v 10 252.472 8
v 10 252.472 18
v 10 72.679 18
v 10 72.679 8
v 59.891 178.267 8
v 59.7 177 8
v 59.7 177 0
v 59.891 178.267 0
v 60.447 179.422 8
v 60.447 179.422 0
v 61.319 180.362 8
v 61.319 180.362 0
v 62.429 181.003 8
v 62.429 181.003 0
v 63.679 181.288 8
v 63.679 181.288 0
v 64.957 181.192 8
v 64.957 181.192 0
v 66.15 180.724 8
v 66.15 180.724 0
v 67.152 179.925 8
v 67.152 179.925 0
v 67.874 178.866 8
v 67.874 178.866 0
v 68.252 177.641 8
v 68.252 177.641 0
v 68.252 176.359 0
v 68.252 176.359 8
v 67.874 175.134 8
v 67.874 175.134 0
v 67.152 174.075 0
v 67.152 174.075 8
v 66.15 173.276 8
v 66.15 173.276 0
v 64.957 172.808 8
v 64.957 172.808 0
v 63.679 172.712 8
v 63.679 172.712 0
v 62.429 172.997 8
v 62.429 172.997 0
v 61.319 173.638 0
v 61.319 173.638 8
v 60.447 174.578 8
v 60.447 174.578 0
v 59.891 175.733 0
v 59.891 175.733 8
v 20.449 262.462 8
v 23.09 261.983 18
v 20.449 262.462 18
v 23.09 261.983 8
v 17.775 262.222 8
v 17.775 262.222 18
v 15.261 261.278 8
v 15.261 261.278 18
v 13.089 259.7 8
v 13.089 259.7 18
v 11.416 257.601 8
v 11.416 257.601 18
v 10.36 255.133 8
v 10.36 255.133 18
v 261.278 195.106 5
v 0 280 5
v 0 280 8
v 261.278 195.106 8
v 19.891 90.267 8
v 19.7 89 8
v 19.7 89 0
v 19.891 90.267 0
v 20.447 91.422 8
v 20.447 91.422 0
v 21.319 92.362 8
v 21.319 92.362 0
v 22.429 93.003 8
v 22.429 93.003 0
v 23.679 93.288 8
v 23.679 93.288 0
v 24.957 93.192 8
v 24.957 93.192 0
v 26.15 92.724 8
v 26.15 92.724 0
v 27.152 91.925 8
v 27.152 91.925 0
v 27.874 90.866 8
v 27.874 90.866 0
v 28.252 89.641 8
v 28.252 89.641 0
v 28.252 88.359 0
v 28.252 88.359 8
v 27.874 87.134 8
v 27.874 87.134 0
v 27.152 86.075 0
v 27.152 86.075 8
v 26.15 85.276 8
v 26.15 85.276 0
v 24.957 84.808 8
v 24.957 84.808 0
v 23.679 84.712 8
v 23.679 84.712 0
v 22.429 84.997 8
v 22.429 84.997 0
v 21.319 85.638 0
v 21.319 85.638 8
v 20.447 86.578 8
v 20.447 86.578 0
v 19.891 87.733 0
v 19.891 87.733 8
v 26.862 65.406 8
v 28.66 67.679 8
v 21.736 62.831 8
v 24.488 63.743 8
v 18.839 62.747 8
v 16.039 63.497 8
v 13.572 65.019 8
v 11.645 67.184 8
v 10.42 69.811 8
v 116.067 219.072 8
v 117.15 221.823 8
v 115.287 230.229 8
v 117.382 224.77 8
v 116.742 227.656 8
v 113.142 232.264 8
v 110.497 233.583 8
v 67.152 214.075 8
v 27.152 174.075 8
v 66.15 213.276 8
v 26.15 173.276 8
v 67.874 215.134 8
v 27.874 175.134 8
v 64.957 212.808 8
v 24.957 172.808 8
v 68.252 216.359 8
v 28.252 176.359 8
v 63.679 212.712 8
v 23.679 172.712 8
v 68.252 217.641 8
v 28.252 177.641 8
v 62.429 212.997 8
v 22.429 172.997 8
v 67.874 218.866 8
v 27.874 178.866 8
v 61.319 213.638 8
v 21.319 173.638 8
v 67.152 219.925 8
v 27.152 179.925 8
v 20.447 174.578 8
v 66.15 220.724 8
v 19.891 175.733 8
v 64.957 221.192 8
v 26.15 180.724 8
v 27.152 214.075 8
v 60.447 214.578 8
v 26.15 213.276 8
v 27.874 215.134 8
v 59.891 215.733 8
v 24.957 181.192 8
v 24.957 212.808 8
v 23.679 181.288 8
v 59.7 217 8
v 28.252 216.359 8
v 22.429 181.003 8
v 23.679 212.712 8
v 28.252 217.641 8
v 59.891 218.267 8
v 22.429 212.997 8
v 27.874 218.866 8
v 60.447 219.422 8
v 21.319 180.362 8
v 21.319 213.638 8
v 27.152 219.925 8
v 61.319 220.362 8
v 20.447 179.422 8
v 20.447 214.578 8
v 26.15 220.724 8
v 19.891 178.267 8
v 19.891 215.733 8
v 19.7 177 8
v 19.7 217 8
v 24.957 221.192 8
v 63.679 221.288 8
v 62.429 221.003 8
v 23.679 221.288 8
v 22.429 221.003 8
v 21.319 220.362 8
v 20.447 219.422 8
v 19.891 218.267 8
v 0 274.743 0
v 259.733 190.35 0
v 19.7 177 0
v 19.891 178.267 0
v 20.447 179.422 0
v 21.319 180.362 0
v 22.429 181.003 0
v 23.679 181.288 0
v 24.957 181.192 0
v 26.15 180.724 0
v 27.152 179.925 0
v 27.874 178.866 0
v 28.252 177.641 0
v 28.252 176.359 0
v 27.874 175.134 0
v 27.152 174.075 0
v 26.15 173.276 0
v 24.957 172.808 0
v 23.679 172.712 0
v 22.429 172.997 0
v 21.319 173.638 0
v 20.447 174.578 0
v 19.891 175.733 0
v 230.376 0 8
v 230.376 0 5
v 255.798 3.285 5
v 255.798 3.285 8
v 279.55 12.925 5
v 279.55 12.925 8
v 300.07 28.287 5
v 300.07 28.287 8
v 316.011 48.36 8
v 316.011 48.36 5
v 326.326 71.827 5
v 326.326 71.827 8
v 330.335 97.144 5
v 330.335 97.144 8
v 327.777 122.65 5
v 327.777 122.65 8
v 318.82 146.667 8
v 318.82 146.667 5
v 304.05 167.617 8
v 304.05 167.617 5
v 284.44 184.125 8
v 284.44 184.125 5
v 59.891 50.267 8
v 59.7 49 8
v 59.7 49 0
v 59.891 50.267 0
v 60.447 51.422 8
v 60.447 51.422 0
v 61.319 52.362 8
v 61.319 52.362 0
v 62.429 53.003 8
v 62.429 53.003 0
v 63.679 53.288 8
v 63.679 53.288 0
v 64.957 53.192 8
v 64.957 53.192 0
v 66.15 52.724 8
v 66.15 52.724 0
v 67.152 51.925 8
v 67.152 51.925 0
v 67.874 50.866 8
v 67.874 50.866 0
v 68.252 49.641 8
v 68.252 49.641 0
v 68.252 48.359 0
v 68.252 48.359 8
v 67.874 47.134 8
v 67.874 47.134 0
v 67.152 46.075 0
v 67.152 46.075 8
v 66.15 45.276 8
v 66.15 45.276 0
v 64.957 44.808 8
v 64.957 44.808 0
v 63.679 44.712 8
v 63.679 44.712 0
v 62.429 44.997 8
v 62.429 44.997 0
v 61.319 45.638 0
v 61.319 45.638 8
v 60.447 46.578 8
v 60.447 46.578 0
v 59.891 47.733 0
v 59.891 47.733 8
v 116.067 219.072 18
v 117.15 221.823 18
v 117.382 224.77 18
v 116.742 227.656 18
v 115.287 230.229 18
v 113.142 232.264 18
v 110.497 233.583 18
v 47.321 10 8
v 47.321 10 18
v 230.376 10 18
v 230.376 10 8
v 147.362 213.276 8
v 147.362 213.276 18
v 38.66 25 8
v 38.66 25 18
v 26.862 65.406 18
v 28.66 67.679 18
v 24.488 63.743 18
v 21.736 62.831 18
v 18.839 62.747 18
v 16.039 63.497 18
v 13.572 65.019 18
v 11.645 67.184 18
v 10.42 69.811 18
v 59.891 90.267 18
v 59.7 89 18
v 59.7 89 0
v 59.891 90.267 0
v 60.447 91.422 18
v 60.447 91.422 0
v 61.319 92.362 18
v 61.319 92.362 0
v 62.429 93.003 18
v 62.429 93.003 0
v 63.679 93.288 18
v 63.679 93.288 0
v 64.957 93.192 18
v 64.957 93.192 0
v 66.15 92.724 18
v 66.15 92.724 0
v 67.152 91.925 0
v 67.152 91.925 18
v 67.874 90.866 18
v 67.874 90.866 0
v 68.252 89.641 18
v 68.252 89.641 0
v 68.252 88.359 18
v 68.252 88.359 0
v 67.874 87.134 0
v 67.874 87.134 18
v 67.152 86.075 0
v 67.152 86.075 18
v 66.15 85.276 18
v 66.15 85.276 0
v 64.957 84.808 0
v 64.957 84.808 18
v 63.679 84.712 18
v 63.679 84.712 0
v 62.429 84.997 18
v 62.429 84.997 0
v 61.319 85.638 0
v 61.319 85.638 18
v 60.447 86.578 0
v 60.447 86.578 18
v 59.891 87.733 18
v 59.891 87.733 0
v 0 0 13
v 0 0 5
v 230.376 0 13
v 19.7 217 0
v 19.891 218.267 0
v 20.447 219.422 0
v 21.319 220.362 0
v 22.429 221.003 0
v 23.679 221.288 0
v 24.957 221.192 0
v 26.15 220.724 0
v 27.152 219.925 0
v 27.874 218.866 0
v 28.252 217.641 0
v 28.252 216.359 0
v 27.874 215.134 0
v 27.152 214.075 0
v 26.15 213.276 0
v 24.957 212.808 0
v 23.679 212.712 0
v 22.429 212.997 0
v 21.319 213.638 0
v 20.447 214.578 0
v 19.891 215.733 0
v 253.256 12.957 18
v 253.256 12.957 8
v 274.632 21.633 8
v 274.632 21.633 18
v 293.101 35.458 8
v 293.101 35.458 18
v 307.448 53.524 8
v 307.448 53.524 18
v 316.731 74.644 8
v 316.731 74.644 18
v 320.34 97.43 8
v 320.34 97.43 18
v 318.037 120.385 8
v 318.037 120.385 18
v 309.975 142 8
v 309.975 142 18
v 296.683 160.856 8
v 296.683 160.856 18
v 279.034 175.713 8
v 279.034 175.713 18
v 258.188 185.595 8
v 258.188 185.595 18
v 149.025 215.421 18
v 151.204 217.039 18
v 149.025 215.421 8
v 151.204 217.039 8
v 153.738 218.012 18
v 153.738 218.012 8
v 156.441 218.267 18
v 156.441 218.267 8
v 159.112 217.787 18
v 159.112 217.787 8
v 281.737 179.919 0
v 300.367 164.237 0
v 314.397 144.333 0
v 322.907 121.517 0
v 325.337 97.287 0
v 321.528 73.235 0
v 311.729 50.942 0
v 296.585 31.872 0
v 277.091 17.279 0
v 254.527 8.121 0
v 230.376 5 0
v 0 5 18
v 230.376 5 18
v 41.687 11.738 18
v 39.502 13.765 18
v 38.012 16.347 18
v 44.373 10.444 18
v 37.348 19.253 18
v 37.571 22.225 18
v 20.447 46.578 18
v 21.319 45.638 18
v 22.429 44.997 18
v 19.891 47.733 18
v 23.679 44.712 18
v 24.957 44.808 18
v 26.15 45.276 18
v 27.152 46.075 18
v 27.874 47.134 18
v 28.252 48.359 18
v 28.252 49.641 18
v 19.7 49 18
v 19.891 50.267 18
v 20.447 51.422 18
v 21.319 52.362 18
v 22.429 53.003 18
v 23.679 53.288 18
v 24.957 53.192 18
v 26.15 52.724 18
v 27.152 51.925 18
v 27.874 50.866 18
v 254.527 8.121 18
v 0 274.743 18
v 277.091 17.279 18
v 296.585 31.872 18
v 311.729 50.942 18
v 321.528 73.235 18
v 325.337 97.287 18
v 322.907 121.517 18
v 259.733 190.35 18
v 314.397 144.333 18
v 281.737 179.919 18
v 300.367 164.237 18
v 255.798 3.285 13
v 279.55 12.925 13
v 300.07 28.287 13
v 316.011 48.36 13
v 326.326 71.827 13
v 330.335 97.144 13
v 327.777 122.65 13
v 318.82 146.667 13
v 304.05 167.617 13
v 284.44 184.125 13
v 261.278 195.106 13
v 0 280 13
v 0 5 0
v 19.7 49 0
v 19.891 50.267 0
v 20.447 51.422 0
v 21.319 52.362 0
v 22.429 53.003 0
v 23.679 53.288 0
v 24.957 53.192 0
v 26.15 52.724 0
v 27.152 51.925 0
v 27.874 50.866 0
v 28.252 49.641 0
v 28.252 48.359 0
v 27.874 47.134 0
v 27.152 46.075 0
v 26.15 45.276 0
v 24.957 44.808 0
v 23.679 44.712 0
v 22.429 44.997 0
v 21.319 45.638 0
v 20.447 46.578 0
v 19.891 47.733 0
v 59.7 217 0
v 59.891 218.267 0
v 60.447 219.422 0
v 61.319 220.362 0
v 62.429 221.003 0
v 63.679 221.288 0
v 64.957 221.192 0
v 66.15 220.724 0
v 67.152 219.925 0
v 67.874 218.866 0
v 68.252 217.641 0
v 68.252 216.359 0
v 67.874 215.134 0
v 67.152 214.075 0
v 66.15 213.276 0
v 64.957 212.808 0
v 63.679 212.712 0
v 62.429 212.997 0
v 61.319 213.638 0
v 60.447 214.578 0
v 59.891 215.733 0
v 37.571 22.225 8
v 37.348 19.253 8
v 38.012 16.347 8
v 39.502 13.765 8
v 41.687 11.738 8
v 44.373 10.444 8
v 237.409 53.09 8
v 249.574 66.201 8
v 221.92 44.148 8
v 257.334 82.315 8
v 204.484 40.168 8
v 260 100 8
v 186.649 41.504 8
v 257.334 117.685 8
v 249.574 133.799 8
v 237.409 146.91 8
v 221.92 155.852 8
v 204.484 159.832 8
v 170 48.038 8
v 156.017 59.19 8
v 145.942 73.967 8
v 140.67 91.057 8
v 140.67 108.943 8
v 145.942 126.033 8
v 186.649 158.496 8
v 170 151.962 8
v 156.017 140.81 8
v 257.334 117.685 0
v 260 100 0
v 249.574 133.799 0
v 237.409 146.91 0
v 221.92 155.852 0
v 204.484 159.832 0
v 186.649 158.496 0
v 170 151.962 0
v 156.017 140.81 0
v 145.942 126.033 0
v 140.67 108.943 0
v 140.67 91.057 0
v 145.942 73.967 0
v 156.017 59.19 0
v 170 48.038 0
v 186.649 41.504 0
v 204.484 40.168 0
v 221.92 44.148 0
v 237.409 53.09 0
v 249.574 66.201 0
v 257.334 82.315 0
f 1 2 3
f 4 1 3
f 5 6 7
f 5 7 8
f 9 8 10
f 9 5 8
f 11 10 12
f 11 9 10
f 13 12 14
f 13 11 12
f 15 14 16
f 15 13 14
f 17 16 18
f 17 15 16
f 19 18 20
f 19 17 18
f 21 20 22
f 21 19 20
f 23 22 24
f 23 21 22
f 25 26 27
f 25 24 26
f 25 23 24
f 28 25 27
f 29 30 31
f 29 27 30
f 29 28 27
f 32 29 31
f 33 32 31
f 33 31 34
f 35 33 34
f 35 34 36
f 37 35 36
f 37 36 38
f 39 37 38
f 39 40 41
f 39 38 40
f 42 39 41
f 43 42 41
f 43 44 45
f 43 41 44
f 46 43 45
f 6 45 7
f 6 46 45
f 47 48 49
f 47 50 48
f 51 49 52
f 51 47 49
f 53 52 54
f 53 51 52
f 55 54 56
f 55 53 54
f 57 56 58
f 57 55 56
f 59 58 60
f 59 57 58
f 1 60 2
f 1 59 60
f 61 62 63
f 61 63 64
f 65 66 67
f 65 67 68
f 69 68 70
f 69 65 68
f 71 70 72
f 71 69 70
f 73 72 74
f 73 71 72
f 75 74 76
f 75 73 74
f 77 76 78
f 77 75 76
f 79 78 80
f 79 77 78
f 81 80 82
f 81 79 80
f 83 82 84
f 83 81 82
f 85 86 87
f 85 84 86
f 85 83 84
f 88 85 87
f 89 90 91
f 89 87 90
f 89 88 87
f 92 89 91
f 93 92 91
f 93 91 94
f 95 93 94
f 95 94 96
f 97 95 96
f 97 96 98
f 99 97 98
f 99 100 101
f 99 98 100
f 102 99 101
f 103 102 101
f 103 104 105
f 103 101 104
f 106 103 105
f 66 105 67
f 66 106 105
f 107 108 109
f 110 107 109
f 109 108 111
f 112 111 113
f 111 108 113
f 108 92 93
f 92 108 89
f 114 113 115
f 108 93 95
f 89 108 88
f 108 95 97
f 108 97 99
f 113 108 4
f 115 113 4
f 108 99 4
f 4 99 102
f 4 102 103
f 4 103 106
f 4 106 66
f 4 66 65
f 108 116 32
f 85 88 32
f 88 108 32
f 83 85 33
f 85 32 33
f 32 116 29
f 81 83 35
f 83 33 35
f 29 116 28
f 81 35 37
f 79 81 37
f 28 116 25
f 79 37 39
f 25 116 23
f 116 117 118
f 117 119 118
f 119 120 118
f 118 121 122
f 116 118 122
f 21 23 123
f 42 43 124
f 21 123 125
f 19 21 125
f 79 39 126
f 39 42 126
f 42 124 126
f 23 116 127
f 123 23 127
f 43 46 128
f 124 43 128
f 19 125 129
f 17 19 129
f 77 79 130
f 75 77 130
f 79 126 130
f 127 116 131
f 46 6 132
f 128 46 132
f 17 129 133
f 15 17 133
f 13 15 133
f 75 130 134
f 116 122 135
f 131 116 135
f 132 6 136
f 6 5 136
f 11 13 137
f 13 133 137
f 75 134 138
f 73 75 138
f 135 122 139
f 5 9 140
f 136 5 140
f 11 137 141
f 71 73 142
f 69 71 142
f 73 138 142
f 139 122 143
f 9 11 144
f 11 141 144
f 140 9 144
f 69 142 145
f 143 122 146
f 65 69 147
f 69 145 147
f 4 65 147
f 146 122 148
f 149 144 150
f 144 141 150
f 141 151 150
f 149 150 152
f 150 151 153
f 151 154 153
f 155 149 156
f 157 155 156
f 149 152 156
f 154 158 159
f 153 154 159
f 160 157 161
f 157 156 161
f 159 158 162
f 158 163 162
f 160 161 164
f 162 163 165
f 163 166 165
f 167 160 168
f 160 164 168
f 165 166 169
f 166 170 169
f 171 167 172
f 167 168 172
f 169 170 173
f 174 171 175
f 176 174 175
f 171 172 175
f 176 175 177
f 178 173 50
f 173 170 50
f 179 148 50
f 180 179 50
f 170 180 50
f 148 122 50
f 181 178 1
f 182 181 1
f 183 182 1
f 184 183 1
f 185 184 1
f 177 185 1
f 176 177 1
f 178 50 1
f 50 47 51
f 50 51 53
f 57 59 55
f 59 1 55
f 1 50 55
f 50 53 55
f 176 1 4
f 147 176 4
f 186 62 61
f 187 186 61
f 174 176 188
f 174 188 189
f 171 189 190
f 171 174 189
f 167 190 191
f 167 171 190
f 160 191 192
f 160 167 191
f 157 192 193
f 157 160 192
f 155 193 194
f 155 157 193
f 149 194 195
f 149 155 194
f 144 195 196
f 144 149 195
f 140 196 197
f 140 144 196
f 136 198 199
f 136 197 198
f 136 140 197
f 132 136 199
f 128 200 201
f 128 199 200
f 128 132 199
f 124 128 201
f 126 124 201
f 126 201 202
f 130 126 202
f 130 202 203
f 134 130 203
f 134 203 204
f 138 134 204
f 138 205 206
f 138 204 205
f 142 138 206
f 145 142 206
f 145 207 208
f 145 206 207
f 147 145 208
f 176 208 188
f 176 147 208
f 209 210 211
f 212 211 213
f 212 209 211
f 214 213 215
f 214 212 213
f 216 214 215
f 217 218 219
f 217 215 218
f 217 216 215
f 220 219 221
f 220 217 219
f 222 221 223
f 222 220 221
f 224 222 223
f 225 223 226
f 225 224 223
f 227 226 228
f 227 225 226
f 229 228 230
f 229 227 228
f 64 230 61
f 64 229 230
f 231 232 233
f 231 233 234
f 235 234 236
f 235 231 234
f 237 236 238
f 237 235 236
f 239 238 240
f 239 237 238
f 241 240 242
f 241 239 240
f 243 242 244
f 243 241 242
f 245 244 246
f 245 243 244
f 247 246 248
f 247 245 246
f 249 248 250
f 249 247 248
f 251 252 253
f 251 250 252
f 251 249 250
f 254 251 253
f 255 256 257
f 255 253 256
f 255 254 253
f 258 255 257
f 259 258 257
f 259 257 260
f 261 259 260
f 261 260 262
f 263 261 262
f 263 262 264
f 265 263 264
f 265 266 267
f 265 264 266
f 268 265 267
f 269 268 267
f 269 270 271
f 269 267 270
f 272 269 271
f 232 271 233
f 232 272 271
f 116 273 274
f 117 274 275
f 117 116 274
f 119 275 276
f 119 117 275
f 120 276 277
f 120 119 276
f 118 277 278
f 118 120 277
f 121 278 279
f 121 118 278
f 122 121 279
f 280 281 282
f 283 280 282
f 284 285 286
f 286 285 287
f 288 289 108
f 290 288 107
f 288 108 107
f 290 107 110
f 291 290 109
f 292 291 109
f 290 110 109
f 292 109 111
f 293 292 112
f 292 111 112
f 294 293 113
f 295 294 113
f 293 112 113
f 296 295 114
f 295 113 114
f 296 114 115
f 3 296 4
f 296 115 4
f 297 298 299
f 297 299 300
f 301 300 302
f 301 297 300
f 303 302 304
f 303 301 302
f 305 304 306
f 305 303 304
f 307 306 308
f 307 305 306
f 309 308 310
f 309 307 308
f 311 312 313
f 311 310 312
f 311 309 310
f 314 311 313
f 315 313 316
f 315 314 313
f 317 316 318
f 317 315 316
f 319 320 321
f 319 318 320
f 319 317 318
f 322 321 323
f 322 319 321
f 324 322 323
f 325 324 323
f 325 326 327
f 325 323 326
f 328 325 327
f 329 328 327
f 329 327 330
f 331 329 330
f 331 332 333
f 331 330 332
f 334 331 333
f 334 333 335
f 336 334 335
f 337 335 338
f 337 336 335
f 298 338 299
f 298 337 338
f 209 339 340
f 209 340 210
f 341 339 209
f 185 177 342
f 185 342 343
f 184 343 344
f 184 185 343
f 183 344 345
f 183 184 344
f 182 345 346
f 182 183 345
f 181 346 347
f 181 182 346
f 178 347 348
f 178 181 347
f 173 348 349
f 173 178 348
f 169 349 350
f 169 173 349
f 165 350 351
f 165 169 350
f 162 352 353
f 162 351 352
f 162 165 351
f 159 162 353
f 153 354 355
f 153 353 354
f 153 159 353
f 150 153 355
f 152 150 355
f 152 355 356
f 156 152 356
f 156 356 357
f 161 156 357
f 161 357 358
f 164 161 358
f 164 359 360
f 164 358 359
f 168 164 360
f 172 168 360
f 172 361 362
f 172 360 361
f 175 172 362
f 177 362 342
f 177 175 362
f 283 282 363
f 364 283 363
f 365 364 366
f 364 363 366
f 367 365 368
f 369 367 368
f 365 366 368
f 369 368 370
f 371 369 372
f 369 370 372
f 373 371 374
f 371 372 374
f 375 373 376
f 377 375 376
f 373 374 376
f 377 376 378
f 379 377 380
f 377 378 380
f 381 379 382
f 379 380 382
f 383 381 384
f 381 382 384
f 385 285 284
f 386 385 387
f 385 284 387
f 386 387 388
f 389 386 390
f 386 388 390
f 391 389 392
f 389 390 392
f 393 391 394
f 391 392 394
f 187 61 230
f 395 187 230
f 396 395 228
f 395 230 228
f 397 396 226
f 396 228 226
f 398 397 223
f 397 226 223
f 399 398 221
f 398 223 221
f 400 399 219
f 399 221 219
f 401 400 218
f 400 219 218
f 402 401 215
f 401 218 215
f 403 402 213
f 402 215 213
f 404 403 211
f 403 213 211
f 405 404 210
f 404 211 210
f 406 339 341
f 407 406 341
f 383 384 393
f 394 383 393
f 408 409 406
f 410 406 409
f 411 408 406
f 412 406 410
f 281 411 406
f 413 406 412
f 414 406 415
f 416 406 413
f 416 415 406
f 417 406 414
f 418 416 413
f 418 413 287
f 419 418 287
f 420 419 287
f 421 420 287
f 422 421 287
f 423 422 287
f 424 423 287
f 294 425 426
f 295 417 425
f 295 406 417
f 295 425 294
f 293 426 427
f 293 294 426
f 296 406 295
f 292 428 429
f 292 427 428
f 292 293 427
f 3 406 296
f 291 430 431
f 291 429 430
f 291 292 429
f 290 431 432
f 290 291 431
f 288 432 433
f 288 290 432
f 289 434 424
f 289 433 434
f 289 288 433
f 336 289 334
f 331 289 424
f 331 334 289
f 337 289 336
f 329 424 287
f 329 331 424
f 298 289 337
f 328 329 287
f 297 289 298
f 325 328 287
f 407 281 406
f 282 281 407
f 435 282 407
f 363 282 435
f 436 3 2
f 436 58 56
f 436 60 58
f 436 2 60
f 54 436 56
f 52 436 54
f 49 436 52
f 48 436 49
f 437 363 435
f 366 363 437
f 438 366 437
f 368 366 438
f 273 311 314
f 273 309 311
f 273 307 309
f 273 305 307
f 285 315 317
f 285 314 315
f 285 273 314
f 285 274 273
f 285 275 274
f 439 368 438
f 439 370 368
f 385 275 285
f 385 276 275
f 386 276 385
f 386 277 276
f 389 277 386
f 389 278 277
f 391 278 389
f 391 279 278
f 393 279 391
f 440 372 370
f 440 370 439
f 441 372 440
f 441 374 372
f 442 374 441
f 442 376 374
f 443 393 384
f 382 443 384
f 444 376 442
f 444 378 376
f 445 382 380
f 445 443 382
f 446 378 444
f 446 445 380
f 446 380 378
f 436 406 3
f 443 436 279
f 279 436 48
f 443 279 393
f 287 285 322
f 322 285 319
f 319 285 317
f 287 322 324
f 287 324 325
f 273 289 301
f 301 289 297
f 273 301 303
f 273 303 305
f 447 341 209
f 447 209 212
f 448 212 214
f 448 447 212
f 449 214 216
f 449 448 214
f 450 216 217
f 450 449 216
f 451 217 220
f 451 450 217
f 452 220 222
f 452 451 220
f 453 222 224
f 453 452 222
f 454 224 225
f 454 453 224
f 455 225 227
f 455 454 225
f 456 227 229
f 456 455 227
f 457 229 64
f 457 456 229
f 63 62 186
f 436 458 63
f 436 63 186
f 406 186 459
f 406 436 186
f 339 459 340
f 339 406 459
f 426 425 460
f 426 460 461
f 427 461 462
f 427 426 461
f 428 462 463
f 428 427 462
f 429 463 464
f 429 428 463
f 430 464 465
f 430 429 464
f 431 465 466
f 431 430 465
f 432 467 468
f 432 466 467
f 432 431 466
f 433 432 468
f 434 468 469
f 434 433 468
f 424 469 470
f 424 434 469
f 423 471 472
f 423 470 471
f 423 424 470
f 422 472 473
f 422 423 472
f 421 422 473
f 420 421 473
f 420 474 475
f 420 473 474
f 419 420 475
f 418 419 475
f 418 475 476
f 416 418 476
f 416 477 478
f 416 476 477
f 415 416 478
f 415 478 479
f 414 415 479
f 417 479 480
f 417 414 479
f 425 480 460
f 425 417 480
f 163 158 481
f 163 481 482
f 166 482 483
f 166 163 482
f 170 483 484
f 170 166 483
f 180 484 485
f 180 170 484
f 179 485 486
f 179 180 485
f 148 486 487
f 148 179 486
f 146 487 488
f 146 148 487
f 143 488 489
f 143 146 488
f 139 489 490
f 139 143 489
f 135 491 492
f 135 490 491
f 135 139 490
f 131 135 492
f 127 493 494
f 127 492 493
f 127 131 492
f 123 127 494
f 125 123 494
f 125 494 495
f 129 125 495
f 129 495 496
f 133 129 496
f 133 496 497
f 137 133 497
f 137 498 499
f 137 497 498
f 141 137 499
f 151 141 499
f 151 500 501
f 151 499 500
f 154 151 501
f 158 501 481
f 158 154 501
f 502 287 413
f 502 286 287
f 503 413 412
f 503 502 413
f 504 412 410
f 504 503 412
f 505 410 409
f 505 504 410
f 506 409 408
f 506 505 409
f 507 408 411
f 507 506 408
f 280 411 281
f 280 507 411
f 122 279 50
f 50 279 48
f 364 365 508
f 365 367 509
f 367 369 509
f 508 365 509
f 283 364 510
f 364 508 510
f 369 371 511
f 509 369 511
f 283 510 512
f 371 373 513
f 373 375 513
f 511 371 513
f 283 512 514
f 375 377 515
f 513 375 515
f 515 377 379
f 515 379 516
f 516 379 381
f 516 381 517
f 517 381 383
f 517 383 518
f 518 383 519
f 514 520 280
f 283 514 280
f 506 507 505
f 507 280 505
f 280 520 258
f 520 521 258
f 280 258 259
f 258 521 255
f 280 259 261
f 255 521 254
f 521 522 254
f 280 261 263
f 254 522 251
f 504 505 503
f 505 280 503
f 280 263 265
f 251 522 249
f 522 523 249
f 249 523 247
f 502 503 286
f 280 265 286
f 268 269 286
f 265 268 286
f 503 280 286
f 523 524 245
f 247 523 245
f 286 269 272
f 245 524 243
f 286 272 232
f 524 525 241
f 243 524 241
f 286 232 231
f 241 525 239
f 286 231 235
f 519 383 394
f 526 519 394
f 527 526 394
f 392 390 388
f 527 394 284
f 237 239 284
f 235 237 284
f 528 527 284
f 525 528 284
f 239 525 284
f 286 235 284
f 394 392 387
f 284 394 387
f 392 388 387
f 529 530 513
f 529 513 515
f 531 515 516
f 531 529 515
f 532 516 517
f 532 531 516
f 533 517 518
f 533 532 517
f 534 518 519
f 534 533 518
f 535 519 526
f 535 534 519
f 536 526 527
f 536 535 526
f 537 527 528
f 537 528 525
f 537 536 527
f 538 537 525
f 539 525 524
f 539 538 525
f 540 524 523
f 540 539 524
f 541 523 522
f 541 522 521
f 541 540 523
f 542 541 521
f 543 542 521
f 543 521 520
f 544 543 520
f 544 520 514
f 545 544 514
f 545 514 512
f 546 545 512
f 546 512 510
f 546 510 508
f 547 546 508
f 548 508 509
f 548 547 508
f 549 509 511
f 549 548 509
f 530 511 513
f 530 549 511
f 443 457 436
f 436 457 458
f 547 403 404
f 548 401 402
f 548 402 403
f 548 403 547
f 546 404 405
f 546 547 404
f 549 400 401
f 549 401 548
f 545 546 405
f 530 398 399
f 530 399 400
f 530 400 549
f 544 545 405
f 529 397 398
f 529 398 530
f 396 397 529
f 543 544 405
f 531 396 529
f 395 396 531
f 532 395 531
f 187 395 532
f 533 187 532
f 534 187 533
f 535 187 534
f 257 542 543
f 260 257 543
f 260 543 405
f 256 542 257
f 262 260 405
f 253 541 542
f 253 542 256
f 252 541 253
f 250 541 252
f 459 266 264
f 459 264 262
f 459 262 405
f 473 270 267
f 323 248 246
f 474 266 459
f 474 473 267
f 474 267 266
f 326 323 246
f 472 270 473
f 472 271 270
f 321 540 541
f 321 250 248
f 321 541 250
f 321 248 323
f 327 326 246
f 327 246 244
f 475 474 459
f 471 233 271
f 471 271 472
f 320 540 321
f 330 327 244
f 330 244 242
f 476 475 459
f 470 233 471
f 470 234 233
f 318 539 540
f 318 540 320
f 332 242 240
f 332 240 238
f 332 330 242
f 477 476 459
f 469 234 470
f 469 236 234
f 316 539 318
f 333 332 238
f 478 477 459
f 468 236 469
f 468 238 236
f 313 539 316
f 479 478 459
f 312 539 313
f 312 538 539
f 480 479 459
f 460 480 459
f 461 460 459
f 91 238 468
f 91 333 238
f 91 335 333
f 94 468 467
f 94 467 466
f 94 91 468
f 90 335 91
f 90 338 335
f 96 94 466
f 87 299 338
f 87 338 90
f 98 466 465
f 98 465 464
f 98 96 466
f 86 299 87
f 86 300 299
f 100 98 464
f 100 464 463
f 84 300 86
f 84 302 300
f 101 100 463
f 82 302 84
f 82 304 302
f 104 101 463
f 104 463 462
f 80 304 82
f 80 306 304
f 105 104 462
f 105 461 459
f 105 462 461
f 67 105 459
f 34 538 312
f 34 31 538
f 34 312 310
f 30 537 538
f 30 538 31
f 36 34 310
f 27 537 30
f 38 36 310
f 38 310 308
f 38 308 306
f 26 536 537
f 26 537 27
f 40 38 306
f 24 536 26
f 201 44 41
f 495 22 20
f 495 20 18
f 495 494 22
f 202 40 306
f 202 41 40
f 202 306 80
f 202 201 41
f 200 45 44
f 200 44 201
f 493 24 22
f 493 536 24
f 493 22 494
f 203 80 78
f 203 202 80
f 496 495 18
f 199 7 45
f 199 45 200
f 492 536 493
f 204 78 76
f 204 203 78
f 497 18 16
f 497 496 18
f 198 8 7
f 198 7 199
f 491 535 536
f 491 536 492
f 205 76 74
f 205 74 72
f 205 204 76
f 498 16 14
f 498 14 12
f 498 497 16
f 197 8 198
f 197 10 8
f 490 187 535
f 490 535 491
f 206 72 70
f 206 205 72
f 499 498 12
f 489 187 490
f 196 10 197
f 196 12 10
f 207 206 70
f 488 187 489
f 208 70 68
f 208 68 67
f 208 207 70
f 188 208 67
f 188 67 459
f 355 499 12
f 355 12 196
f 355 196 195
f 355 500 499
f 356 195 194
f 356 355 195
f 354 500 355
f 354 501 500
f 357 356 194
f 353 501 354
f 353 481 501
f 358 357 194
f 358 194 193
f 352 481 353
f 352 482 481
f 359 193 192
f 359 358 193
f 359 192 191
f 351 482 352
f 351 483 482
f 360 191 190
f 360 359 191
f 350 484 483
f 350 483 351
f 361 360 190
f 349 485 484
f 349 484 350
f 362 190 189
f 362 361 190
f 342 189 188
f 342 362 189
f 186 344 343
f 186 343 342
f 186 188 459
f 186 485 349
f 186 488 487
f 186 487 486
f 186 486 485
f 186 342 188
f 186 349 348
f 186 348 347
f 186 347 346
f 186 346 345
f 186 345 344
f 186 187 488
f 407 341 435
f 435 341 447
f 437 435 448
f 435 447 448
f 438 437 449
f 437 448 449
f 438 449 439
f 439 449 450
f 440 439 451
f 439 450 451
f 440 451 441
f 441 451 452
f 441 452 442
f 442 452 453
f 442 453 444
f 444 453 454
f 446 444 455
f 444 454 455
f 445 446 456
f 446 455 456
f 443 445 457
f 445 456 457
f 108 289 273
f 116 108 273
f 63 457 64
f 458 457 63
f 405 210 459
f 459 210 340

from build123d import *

# Parameters (mm, degrees)
SKETCH_1_R               = 60
EXTRUDE_1_DEPTH          = 8
FILLET_1_R               = 100
EXTRUDE_START            = 10
EXTRUDE_2_DEPTH          = 10
FILLET_2_R               = 10
CHAMFER_1_SIZE           = 5
CUT_EXTRUDE_1_DEPTH      = 434.442567426
CUT_EXTRUDE_1_DEPTH_BACK = 434.442567426
SKETCH_3_R               = 4.3


with BuildPart() as part:
    # 草图1 → 凸台-拉伸1 (new body)
    with BuildSketch(Plane.XY):
        Polygon((0, 0), (0, 280), (861.751390409, 0), align=None)
        with Locations((200, 100)):
            Circle(SKETCH_1_R, mode=Mode.SUBTRACT)
    extrude(amount=EXTRUDE_1_DEPTH)

    # 圆角1
    fillet_1_edges = [part.edges().sort_by_distance(p)[0] for p in [
        (861.751390409, 0, 4),
    ]]
    fillet(fillet_1_edges, radius=FILLET_1_R)

    # 草图2 → 凸台-拉伸2 (add)
    with BuildSketch(Plane.XY.offset(8).offset(EXTRUDE_START)):
        with BuildLine():
            Line((0, 0), (230.376238942, 0))
            ThreePointArc((230.376238942, 0), (329.145073001, 84.356553496), (261.277938379, 195.10565163))
            Line((261.277938379, 195.10565163), (0, 280))
            Line((0, 280), (0, 0))
        make_face()
        Polygon((10, 266.236180795), (10, 35.358983849), (122.241374643, 229.766747442), align=None, mode=Mode.SUBTRACT)
        with BuildLine():
            Line((30, 10), (230.376238942, 10))
            ThreePointArc((230.376238942, 10), (319.268189595, 85.920898146), (258.187768435, 185.595086467))
            Line((258.187768435, 185.595086467), (151.410485182, 220.289128906))
            Line((151.410485182, 220.289128906), (30, 10))
        make_face(mode=Mode.SUBTRACT)
    extrude(amount=-EXTRUDE_2_DEPTH)

    # 圆角2
    fillet_2_edges = [part.edges().sort_by_distance(p)[0] for p in [
        (10, 266.236180795, 13),
        (10, 35.358983849, 13),
        (122.241374643, 229.766747442, 13),
        (30, 10, 13),
        (151.410485182, 220.289128906, 13),
    ]]
    fillet(fillet_2_edges, radius=FILLET_2_R)

    # 倒角1
    chamfer_1_edges = [part.edges().sort_by_distance(p)[0] for p in [
        (130.63896919, 237.552825815, 0),
        (329.145073001, 84.356553496, 0),
        (115.188119471, 0, 18),
        (329.145073001, 84.356553496, 18),
        (130.63896919, 237.552825815, 18),
        (115.188119471, 0, 0),
    ]]
    chamfer(chamfer_1_edges, length=CHAMFER_1_SIZE)

    # 草图3 → 切除-拉伸1 (cut, two sides: drawn at the far end of the back side and taken through both)
    with BuildSketch(Plane(origin=(0, 0, 0), x_dir=(-1, 0, 0), z_dir=(0, 0, -1)).offset(-CUT_EXTRUDE_1_DEPTH_BACK)):
        with Locations((-64, 217)):
            Circle(SKETCH_3_R)
        with Locations((-64, 177)):
            Circle(SKETCH_3_R)
        with Locations((-24, 217)):
            Circle(SKETCH_3_R)
        with Locations((-24, 177)):
            Circle(SKETCH_3_R)
        with Locations((-64, 89)):
            Circle(SKETCH_3_R)
        with Locations((-24, 89)):
            Circle(SKETCH_3_R)
        with Locations((-64, 49)):
            Circle(SKETCH_3_R)
        with Locations((-24, 49)):
            Circle(SKETCH_3_R)
    extrude(amount=CUT_EXTRUDE_1_DEPTH + CUT_EXTRUDE_1_DEPTH_BACK, mode=Mode.SUBTRACT)


solid = part.part
